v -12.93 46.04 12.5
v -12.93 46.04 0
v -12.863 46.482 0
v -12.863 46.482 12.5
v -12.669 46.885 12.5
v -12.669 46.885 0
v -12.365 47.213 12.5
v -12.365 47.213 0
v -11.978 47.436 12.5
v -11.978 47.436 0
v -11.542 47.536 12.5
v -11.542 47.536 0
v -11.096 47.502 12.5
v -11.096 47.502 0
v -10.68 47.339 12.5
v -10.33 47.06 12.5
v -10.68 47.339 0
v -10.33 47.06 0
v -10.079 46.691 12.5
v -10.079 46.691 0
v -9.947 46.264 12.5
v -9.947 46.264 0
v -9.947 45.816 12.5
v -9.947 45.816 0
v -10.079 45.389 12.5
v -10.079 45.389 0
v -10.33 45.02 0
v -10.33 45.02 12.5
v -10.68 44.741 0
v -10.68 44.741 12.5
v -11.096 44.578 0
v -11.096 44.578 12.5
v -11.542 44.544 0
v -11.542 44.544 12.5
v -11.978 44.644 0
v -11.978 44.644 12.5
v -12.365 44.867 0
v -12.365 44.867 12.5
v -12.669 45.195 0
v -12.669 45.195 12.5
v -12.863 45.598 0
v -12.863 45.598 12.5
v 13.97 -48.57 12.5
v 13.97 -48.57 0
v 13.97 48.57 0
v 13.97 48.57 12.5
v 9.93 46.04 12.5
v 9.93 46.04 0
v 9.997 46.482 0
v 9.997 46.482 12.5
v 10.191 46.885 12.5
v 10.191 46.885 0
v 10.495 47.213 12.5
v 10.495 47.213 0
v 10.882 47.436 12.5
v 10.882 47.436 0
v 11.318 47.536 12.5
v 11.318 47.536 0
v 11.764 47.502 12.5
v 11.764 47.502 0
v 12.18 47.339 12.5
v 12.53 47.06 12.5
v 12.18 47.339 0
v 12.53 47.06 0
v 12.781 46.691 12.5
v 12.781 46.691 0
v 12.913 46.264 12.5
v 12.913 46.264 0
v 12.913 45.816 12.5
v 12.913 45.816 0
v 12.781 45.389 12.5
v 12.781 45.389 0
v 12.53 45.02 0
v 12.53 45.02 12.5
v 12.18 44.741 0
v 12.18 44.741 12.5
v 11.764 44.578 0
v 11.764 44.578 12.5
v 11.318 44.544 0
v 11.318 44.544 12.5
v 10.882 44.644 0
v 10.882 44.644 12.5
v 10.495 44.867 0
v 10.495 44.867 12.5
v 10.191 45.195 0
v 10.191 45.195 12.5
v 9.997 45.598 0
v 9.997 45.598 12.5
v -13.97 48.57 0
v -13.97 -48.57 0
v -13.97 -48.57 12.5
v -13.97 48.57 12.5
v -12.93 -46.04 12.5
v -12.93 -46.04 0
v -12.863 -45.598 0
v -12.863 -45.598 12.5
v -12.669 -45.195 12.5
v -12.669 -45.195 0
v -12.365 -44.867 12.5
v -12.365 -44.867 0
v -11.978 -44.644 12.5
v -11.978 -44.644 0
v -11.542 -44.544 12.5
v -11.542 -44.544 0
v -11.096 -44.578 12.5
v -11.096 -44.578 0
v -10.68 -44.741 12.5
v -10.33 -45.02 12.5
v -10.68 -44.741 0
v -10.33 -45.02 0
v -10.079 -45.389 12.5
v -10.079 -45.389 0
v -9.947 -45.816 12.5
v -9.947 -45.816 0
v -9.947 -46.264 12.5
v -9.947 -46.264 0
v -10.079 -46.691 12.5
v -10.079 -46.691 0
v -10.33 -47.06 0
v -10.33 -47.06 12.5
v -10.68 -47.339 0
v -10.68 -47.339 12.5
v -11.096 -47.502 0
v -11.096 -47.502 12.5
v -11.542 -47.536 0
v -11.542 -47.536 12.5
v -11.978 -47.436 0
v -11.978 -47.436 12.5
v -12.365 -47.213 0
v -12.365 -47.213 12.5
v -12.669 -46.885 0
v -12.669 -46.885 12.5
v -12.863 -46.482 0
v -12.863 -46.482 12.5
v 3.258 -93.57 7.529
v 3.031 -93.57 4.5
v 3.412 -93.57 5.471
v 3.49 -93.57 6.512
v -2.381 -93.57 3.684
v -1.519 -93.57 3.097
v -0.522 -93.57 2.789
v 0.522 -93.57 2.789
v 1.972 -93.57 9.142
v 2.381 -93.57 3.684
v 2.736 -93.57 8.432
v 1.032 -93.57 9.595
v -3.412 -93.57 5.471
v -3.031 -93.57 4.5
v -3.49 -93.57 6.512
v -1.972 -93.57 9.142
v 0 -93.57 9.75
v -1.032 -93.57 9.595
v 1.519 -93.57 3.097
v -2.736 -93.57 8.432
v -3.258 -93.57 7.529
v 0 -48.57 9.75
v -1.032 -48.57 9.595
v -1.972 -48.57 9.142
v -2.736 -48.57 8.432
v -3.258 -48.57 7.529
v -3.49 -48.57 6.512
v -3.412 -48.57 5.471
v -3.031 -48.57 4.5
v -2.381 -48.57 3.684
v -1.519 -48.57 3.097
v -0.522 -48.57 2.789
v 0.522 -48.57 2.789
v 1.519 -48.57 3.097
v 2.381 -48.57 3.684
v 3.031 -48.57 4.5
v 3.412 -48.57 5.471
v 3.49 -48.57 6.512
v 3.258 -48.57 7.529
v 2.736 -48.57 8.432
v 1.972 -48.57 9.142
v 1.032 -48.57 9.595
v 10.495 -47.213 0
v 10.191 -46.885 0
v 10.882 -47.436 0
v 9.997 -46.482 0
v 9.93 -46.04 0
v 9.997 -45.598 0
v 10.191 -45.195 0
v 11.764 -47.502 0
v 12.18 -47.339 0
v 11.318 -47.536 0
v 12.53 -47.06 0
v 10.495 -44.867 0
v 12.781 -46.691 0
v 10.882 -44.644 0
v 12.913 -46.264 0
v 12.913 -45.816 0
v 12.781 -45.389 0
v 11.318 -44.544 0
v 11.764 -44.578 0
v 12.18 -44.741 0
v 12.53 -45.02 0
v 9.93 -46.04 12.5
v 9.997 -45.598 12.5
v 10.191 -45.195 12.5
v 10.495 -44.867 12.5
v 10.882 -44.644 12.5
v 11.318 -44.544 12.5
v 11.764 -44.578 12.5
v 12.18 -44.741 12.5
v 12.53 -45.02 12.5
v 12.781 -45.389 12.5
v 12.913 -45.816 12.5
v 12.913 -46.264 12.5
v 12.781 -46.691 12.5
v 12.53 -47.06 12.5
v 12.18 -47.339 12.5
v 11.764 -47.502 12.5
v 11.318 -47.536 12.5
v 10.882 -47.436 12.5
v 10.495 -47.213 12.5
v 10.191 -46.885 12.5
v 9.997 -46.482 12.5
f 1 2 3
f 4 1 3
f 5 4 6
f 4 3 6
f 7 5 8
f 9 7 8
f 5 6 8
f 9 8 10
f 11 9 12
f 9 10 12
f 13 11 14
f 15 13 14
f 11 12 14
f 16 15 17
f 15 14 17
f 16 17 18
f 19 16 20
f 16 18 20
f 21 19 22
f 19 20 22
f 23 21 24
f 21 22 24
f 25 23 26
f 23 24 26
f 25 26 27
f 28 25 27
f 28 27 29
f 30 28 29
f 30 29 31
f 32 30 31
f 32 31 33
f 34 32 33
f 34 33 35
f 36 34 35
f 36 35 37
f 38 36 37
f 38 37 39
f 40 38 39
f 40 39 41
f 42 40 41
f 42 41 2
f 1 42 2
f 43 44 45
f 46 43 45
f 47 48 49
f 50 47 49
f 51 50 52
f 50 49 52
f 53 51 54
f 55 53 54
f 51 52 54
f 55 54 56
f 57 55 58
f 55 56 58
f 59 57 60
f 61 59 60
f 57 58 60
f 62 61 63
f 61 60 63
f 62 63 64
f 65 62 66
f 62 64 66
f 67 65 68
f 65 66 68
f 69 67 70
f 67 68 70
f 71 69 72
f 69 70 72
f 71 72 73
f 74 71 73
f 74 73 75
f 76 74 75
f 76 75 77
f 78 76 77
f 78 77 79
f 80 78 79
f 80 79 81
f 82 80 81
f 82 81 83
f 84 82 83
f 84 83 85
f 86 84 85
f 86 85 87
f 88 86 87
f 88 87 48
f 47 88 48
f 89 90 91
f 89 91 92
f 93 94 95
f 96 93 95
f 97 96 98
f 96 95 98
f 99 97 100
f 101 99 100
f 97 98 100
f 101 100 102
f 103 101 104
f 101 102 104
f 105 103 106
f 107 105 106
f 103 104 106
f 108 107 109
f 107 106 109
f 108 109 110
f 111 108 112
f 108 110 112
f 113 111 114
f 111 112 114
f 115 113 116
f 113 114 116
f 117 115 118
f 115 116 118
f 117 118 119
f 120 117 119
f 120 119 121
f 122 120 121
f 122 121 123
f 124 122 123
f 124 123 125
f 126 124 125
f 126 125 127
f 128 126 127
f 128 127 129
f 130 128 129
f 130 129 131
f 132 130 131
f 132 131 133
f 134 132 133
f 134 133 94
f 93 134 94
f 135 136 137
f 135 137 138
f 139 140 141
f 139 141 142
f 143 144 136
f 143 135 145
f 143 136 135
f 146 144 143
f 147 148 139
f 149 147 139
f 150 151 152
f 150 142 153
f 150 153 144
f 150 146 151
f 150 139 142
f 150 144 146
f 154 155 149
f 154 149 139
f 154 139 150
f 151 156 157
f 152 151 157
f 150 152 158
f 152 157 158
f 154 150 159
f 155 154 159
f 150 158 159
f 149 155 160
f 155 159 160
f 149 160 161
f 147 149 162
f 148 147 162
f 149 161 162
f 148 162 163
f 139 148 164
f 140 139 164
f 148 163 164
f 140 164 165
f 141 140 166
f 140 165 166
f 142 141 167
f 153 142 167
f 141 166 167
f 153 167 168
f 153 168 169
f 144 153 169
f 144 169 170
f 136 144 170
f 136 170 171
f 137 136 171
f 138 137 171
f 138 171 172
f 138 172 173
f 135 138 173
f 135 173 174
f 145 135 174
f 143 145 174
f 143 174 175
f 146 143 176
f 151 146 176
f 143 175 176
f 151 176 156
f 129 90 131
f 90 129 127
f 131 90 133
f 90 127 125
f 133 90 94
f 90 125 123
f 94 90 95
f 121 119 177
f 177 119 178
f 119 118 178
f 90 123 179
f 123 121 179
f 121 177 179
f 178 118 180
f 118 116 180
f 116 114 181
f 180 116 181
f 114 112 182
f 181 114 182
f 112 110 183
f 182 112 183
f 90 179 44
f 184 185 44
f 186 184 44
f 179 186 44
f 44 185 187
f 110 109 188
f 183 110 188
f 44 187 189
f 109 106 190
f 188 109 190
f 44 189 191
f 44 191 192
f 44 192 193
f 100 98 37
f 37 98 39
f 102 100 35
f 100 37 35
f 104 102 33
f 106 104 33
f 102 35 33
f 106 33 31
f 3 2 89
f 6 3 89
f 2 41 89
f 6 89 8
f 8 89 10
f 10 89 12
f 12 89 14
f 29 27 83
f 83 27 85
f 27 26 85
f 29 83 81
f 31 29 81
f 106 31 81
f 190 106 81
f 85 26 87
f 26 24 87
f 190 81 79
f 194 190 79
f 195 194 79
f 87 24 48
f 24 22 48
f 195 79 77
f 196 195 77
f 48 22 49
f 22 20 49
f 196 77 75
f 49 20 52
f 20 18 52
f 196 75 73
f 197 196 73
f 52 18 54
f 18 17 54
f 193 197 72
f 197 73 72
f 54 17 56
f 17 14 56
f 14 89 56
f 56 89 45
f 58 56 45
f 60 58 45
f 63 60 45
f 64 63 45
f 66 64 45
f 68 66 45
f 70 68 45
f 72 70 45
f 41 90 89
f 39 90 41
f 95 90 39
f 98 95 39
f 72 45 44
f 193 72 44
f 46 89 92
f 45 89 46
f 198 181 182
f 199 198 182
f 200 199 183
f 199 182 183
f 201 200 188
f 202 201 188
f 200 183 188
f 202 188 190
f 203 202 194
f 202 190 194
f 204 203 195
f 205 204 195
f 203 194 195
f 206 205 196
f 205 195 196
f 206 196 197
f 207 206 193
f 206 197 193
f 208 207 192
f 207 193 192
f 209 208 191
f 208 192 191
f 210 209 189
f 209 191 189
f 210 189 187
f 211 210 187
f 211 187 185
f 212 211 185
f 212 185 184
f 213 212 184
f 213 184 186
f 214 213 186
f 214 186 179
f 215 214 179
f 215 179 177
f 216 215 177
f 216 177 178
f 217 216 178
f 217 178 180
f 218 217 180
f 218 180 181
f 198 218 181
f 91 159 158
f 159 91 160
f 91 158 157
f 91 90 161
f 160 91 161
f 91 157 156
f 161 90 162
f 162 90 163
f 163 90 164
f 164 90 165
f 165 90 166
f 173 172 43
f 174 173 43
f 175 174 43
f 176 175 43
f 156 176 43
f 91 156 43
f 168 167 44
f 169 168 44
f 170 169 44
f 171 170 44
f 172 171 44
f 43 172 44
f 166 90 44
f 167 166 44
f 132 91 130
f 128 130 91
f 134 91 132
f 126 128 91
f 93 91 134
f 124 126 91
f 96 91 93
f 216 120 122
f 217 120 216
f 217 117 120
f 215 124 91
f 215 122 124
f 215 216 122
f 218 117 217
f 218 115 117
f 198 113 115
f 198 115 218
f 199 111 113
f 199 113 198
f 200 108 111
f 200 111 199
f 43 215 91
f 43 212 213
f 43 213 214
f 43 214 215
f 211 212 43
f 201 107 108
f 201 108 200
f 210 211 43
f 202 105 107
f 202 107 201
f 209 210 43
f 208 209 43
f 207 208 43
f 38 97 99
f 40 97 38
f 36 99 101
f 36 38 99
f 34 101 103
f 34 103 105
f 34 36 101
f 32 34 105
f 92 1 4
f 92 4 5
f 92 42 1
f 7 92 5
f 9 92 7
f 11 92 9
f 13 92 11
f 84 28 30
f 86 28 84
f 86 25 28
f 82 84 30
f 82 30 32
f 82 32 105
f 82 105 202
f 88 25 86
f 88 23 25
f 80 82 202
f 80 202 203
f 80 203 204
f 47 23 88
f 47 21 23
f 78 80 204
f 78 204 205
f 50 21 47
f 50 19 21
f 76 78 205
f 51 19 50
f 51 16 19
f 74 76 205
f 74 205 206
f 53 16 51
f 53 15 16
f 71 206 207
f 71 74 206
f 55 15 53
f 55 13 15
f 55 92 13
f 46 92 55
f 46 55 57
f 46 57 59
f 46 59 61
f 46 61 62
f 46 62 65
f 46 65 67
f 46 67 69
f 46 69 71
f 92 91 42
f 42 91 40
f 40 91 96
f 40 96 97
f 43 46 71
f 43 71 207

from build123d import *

# Parameters (mm, degrees)
SKETCH1_W           = 27.94
SKETCH1_H           = 97.14
BOSS_EXTRUDE1_DEPTH = 12.5
SKETCH2_R           = 1.5
CUT_EXTRUDE1_DEPTH  = 23
SKETCH3_R           = 3.5
BOSS_EXTRUDE2_DEPTH = 45


with BuildPart() as part:
    # Sketch1 → Boss-Extrude1 (new body)
    with BuildSketch(Plane.XY):
        Rectangle(SKETCH1_W, SKETCH1_H)
    extrude(amount=BOSS_EXTRUDE1_DEPTH)

    # Sketch2 → Cut-Extrude1 (cut)
    with BuildSketch(Plane(origin=(0, 0, 0), x_dir=(-1, 0, 0), z_dir=(0, 0, -1))):
        with Locations((-11.43, 46.04)):
            Circle(SKETCH2_R)
        with Locations((-11.43, -46.04)):
            Circle(SKETCH2_R)
        with Locations((11.43, 46.04)):
            Circle(SKETCH2_R)
        with Locations((11.43, -46.04)):
            Circle(SKETCH2_R)
    extrude(amount=-CUT_EXTRUDE1_DEPTH, mode=Mode.SUBTRACT)

    # Sketch3 → Boss-Extrude2 (add)
    with BuildSketch(Plane.XZ.offset(48.57)):
        with Locations(Location((0, 6.25, 0), (0, 0, 90))):
            Circle(SKETCH3_R)
    extrude(amount=BOSS_EXTRUDE2_DEPTH)


solid = part.part
